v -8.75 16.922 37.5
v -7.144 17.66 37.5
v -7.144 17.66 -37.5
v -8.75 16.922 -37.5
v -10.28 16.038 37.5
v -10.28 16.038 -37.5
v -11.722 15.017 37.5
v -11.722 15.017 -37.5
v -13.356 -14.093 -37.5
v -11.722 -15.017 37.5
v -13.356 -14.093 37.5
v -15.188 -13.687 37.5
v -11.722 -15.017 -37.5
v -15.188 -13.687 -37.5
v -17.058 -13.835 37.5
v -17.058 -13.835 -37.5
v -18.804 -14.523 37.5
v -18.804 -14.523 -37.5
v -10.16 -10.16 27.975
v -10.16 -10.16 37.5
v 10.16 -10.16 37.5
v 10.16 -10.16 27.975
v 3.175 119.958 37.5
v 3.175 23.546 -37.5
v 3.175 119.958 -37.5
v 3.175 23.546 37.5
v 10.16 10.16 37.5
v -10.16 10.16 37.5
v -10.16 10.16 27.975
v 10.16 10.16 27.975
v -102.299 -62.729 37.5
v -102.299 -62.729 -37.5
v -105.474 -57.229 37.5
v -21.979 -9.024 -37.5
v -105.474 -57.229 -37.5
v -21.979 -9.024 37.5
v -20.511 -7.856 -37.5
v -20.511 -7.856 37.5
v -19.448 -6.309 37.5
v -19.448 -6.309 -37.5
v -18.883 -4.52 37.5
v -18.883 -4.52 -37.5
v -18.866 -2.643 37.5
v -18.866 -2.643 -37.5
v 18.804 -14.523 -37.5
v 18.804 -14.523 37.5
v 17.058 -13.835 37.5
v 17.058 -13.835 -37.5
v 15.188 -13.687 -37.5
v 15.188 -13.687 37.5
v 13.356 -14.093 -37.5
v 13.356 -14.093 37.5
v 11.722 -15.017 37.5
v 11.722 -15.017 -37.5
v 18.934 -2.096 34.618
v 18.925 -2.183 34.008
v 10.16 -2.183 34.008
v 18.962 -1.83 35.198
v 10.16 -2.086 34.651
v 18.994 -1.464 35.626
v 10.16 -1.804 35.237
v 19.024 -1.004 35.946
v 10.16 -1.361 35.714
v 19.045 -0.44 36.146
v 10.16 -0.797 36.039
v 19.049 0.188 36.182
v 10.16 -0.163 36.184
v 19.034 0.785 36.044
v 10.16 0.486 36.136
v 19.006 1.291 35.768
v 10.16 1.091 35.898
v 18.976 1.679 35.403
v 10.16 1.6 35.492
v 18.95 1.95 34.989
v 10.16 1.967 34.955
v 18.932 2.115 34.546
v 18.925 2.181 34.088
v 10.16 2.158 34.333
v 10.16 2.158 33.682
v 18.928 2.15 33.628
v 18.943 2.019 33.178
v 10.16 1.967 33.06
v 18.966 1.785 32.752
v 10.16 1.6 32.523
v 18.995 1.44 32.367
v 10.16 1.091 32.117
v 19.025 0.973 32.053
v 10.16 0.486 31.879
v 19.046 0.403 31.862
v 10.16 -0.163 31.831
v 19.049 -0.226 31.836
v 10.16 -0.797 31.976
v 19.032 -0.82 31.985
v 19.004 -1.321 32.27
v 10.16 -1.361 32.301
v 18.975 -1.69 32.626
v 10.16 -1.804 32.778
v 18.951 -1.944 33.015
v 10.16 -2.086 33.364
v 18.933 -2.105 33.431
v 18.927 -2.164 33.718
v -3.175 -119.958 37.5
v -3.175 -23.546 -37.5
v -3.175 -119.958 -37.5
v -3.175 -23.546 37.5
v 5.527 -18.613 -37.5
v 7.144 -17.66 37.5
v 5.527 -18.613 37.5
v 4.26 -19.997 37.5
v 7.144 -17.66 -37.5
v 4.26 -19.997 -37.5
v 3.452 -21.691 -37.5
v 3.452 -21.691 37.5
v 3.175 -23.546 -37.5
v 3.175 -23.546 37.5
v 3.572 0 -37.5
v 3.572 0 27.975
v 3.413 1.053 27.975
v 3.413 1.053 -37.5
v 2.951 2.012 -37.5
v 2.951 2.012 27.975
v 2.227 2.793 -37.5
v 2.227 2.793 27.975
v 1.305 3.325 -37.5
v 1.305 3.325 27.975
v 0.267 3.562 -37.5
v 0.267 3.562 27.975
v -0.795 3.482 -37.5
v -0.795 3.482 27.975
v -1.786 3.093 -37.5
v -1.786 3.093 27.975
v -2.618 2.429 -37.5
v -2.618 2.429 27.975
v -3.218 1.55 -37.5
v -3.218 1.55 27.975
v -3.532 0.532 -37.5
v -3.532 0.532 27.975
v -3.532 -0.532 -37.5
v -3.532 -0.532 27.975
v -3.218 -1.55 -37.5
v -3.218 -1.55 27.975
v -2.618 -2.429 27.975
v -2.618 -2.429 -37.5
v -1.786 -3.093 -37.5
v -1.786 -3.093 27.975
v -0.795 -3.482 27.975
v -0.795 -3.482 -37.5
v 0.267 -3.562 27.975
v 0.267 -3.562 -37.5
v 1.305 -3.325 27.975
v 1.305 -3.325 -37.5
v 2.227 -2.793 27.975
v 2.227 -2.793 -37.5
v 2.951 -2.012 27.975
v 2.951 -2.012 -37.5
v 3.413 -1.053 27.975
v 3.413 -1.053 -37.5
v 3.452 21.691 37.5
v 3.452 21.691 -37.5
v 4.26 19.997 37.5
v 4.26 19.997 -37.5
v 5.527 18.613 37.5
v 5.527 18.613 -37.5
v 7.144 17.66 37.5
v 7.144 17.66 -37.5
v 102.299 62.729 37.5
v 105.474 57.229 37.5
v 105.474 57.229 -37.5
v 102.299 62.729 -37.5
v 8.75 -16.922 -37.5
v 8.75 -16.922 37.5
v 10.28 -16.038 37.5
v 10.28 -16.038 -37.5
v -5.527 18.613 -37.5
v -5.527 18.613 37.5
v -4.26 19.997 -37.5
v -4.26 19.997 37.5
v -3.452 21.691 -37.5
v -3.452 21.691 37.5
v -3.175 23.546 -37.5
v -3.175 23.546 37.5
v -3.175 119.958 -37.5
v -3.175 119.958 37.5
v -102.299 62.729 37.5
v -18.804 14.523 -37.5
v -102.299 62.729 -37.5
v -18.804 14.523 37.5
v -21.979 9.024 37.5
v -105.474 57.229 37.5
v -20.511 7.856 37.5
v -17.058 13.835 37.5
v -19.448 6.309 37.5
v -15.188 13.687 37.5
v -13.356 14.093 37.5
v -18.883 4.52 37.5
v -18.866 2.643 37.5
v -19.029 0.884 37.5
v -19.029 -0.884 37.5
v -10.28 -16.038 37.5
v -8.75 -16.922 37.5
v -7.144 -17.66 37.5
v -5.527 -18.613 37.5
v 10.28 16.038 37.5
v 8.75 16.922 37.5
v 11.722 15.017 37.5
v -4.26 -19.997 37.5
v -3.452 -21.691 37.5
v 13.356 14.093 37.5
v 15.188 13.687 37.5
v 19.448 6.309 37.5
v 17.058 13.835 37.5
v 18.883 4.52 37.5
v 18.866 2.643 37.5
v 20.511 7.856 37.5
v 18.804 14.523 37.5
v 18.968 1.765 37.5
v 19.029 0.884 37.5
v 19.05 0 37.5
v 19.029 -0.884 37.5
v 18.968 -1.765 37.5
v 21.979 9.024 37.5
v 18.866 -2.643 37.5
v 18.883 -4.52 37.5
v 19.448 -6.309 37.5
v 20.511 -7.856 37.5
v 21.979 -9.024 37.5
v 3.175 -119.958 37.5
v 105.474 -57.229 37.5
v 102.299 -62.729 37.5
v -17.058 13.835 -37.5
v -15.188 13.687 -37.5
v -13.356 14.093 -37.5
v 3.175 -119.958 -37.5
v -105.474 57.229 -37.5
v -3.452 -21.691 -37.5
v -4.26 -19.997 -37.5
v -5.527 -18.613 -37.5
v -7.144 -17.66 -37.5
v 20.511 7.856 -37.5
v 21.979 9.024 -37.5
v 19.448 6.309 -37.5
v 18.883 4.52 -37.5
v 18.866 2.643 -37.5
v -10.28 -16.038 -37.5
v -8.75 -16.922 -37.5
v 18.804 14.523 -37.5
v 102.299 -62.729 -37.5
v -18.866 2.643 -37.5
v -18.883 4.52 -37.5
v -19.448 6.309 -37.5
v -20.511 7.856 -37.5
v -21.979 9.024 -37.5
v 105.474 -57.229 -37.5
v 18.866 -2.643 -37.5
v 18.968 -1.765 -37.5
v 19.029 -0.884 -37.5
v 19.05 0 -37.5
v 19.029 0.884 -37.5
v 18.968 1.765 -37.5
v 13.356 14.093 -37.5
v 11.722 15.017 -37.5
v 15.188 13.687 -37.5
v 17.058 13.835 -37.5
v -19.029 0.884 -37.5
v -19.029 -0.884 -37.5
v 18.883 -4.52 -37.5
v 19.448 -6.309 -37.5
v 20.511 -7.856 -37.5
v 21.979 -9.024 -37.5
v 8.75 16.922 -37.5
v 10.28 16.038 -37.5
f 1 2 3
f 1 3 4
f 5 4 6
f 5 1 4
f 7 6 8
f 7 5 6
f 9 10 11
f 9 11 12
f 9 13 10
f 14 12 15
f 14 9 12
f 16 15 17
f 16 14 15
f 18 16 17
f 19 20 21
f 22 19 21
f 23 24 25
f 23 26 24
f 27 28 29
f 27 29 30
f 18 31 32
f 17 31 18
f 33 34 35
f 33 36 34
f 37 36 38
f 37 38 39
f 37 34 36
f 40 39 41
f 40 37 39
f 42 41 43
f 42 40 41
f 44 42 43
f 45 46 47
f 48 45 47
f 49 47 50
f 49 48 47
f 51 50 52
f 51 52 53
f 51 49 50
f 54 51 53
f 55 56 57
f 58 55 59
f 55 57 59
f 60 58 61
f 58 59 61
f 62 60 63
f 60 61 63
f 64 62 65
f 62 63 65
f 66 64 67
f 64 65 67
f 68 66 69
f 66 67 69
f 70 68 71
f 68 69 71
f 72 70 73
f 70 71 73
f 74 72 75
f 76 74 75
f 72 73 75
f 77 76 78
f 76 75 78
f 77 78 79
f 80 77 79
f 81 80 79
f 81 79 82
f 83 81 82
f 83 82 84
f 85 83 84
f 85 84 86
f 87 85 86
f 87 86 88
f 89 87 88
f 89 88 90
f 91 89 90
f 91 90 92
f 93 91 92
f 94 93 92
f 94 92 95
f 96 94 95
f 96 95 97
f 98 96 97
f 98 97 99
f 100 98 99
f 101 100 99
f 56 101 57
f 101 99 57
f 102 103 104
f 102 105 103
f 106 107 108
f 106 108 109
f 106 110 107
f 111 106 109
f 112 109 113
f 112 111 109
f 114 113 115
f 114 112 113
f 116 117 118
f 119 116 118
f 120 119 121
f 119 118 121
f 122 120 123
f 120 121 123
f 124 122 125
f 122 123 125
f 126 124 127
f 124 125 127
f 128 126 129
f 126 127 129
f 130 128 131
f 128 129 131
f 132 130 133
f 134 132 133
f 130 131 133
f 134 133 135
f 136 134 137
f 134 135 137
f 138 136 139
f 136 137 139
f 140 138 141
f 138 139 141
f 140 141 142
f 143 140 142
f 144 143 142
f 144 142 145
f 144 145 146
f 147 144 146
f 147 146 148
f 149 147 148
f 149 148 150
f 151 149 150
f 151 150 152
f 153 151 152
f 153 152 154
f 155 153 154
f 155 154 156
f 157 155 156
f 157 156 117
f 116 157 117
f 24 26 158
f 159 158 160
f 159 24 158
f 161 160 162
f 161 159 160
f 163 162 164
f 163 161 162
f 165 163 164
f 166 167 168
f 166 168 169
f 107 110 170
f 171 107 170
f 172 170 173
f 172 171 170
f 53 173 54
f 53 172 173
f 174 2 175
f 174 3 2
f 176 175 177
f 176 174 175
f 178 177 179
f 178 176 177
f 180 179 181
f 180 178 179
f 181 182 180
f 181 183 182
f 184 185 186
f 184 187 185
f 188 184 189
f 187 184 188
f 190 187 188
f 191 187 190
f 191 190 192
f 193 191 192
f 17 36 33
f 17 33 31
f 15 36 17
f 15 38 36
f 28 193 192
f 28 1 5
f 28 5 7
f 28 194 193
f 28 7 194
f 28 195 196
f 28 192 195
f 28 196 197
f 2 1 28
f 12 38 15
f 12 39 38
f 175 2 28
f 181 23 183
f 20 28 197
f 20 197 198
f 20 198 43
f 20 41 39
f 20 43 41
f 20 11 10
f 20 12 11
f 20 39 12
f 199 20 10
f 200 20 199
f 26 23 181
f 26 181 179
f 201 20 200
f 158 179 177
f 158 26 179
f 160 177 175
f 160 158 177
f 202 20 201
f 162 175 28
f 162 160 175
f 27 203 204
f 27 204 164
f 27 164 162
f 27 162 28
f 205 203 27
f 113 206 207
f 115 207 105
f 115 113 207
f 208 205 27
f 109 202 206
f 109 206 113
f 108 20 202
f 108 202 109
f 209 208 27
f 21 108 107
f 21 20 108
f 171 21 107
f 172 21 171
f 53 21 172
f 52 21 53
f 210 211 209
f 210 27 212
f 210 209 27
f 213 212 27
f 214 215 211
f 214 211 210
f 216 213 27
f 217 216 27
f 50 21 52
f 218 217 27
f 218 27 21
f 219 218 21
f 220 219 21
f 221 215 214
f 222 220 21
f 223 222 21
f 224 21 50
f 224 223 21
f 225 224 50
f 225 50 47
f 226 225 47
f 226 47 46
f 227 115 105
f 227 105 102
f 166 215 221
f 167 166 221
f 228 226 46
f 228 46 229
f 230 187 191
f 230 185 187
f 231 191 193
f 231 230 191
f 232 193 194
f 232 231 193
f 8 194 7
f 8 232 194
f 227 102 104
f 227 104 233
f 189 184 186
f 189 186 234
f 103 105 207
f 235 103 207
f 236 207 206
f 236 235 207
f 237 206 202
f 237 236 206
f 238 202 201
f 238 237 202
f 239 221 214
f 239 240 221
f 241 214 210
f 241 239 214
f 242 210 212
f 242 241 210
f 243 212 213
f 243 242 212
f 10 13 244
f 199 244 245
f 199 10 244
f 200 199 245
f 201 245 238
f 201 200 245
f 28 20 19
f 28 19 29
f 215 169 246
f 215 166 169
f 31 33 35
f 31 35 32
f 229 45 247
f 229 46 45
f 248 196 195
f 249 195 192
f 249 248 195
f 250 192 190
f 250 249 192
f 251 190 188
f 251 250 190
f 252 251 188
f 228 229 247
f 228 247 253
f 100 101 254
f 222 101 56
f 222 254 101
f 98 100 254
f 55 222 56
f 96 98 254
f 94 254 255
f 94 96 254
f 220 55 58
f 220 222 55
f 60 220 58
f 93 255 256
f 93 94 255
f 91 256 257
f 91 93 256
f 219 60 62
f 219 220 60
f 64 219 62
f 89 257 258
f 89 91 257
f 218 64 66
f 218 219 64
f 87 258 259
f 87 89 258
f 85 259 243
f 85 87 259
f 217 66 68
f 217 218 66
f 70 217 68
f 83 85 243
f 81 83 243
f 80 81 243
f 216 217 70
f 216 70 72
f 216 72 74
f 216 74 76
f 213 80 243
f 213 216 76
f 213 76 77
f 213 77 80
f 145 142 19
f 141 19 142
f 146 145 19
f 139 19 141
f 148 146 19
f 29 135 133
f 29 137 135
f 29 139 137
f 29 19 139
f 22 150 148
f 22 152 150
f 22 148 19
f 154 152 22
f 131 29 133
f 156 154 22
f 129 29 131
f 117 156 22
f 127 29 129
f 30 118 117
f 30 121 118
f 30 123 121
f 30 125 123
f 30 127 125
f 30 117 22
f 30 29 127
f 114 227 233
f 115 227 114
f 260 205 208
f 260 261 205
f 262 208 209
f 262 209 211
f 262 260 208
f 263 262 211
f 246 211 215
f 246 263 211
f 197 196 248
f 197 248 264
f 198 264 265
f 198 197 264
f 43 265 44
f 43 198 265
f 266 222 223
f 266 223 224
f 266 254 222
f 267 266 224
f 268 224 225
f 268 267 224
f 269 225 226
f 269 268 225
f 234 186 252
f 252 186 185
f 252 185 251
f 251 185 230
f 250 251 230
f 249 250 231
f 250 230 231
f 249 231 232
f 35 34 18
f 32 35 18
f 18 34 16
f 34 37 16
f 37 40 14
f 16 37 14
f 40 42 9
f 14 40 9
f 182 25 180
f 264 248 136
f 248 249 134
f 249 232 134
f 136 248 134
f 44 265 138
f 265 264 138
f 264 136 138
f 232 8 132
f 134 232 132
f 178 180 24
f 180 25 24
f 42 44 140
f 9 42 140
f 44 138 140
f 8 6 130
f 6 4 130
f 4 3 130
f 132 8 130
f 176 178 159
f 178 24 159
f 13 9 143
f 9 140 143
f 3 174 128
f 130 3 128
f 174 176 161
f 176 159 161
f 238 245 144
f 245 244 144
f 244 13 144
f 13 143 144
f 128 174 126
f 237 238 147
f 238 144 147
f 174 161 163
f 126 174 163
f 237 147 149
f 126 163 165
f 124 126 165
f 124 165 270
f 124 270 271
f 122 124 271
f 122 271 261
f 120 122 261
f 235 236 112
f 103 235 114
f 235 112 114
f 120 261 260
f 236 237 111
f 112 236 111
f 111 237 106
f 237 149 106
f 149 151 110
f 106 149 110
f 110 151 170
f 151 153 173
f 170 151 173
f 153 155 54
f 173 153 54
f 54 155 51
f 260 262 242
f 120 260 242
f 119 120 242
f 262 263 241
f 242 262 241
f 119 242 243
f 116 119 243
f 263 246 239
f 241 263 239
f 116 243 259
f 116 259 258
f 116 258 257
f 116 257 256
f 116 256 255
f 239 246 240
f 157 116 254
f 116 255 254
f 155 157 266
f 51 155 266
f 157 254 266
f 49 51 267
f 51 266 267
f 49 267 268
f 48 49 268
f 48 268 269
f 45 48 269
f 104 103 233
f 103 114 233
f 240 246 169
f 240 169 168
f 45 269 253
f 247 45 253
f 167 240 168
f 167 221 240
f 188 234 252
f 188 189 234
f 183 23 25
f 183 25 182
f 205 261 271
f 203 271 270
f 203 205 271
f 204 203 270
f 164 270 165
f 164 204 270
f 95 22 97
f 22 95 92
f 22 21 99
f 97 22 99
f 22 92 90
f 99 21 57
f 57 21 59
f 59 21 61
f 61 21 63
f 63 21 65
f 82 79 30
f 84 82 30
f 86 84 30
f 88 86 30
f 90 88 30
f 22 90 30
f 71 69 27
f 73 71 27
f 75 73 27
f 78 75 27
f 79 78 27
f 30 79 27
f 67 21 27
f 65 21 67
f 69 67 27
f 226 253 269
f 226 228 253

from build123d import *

# Parameters (mm, degrees)
BOSS_EXTRUDE1_DEPTH = 37.5
CIRPATTERN1_COUNT   = 6
FILLET1_R           = 6.35
SKETCH2_W           = 20.32
SKETCH2_H           = 20.32
CUT_EXTRUDE1_DEPTH  = 9.525
SKETCH3_R           = 3.571875
CUT_EXTRUDE2_DEPTH  = 173.631673961
SKETCH4_R           = 2.1828125
CUT_EXTRUDE3_DEPTH  = 171.784747264


with BuildPart() as part:
    # Sketch1 → Boss-Extrude1 (new, symmetric)
    with BuildSketch(Plane.XY):
        with BuildLine():
            Line((-3.175, 119.957990042), (-3.175, 18.783553311))
            ThreePointArc((-3.175, 18.783553311), (0, 19.05), (3.175, 18.783553311))
            Line((3.175, 18.783553311), (3.175, 119.957990042))
            Line((3.175, 119.957990042), (-3.175, 119.957990042))
        make_face()
        with BuildLine():
            Line((-3.175, 18.783553311), (-3.175, 0))
            Line((-3.175, 0), (3.175, 0))
            Line((3.175, 0), (3.175, 18.783553311))
            ThreePointArc((3.175, 18.783553311), (0, 19.05), (-3.175, 18.783553311))
        make_face()
        with BuildLine():
            Line((3.175, 0), (-3.175, 0))
            Line((-3.175, 0), (-3.175, 18.783553311))
            ThreePointArc((-3.175, 18.783553311), (-12.296722124, -14.549677831), (19.05, 0))
            ThreePointArc((19.05, 0), (14.549677831, 12.296722124), (3.175, 18.783553311))
            Line((3.175, 18.783553311), (3.175, 0))
        make_face()
    boss_extrude1 = extrude(amount=BOSS_EXTRUDE1_DEPTH, both=True)

    # CirPattern1: Boss-Extrude1 ×6 about axis
    cirpattern1_axis = Axis((0, 0, 0), (0, 0, 1))
    for i in range(1, CIRPATTERN1_COUNT):
        add(boss_extrude1.rotate(cirpattern1_axis, i * 360 / CIRPATTERN1_COUNT))

    # Fillet1
    fillet1_edges = [part.edges().sort_by_distance(p)[0] for p in [
        (14.679534341, 12.141407313, 0),
        (-17.854534341, 6.642145999, 0),
        (3.175, -18.783553311, 0),
        (17.854534341, -6.642145999, 0),
        (-14.679534341, -12.141407313, 0),
        (-14.679534341, 12.141407313, 0),
        (-3.175, -18.783553311, 0),
        (17.854534341, 6.642145999, 0),
        (14.679534341, -12.141407313, 0),
        (-17.854534341, -6.642145999, 0),
        (-3.175, 18.783553311, 0),
        (3.175, 18.783553311, 0),
    ]]
    fillet(fillet1_edges, radius=FILLET1_R)

    # Sketch2 → Cut-Extrude1 (cut)
    with BuildSketch(Plane.XY.offset(37.5)):
        Rectangle(SKETCH2_W, SKETCH2_H)
    extrude(amount=-CUT_EXTRUDE1_DEPTH, mode=Mode.SUBTRACT)

    # Sketch3 → Cut-Extrude2 (cut, through all)
    with BuildSketch(Plane.XY.offset(27.975)):
        Circle(SKETCH3_R)
    extrude(amount=-CUT_EXTRUDE2_DEPTH, mode=Mode.SUBTRACT)

    # Sketch4 → Cut-Extrude3 (cut, through all)
    with BuildSketch(Plane.ZY.offset(-10.16)):
        with Locations(Location((34.0075, 0, 0), (0, 0, 270))):
            Circle(SKETCH4_R)
    extrude(amount=-CUT_EXTRUDE3_DEPTH, mode=Mode.SUBTRACT)


solid = part.part
